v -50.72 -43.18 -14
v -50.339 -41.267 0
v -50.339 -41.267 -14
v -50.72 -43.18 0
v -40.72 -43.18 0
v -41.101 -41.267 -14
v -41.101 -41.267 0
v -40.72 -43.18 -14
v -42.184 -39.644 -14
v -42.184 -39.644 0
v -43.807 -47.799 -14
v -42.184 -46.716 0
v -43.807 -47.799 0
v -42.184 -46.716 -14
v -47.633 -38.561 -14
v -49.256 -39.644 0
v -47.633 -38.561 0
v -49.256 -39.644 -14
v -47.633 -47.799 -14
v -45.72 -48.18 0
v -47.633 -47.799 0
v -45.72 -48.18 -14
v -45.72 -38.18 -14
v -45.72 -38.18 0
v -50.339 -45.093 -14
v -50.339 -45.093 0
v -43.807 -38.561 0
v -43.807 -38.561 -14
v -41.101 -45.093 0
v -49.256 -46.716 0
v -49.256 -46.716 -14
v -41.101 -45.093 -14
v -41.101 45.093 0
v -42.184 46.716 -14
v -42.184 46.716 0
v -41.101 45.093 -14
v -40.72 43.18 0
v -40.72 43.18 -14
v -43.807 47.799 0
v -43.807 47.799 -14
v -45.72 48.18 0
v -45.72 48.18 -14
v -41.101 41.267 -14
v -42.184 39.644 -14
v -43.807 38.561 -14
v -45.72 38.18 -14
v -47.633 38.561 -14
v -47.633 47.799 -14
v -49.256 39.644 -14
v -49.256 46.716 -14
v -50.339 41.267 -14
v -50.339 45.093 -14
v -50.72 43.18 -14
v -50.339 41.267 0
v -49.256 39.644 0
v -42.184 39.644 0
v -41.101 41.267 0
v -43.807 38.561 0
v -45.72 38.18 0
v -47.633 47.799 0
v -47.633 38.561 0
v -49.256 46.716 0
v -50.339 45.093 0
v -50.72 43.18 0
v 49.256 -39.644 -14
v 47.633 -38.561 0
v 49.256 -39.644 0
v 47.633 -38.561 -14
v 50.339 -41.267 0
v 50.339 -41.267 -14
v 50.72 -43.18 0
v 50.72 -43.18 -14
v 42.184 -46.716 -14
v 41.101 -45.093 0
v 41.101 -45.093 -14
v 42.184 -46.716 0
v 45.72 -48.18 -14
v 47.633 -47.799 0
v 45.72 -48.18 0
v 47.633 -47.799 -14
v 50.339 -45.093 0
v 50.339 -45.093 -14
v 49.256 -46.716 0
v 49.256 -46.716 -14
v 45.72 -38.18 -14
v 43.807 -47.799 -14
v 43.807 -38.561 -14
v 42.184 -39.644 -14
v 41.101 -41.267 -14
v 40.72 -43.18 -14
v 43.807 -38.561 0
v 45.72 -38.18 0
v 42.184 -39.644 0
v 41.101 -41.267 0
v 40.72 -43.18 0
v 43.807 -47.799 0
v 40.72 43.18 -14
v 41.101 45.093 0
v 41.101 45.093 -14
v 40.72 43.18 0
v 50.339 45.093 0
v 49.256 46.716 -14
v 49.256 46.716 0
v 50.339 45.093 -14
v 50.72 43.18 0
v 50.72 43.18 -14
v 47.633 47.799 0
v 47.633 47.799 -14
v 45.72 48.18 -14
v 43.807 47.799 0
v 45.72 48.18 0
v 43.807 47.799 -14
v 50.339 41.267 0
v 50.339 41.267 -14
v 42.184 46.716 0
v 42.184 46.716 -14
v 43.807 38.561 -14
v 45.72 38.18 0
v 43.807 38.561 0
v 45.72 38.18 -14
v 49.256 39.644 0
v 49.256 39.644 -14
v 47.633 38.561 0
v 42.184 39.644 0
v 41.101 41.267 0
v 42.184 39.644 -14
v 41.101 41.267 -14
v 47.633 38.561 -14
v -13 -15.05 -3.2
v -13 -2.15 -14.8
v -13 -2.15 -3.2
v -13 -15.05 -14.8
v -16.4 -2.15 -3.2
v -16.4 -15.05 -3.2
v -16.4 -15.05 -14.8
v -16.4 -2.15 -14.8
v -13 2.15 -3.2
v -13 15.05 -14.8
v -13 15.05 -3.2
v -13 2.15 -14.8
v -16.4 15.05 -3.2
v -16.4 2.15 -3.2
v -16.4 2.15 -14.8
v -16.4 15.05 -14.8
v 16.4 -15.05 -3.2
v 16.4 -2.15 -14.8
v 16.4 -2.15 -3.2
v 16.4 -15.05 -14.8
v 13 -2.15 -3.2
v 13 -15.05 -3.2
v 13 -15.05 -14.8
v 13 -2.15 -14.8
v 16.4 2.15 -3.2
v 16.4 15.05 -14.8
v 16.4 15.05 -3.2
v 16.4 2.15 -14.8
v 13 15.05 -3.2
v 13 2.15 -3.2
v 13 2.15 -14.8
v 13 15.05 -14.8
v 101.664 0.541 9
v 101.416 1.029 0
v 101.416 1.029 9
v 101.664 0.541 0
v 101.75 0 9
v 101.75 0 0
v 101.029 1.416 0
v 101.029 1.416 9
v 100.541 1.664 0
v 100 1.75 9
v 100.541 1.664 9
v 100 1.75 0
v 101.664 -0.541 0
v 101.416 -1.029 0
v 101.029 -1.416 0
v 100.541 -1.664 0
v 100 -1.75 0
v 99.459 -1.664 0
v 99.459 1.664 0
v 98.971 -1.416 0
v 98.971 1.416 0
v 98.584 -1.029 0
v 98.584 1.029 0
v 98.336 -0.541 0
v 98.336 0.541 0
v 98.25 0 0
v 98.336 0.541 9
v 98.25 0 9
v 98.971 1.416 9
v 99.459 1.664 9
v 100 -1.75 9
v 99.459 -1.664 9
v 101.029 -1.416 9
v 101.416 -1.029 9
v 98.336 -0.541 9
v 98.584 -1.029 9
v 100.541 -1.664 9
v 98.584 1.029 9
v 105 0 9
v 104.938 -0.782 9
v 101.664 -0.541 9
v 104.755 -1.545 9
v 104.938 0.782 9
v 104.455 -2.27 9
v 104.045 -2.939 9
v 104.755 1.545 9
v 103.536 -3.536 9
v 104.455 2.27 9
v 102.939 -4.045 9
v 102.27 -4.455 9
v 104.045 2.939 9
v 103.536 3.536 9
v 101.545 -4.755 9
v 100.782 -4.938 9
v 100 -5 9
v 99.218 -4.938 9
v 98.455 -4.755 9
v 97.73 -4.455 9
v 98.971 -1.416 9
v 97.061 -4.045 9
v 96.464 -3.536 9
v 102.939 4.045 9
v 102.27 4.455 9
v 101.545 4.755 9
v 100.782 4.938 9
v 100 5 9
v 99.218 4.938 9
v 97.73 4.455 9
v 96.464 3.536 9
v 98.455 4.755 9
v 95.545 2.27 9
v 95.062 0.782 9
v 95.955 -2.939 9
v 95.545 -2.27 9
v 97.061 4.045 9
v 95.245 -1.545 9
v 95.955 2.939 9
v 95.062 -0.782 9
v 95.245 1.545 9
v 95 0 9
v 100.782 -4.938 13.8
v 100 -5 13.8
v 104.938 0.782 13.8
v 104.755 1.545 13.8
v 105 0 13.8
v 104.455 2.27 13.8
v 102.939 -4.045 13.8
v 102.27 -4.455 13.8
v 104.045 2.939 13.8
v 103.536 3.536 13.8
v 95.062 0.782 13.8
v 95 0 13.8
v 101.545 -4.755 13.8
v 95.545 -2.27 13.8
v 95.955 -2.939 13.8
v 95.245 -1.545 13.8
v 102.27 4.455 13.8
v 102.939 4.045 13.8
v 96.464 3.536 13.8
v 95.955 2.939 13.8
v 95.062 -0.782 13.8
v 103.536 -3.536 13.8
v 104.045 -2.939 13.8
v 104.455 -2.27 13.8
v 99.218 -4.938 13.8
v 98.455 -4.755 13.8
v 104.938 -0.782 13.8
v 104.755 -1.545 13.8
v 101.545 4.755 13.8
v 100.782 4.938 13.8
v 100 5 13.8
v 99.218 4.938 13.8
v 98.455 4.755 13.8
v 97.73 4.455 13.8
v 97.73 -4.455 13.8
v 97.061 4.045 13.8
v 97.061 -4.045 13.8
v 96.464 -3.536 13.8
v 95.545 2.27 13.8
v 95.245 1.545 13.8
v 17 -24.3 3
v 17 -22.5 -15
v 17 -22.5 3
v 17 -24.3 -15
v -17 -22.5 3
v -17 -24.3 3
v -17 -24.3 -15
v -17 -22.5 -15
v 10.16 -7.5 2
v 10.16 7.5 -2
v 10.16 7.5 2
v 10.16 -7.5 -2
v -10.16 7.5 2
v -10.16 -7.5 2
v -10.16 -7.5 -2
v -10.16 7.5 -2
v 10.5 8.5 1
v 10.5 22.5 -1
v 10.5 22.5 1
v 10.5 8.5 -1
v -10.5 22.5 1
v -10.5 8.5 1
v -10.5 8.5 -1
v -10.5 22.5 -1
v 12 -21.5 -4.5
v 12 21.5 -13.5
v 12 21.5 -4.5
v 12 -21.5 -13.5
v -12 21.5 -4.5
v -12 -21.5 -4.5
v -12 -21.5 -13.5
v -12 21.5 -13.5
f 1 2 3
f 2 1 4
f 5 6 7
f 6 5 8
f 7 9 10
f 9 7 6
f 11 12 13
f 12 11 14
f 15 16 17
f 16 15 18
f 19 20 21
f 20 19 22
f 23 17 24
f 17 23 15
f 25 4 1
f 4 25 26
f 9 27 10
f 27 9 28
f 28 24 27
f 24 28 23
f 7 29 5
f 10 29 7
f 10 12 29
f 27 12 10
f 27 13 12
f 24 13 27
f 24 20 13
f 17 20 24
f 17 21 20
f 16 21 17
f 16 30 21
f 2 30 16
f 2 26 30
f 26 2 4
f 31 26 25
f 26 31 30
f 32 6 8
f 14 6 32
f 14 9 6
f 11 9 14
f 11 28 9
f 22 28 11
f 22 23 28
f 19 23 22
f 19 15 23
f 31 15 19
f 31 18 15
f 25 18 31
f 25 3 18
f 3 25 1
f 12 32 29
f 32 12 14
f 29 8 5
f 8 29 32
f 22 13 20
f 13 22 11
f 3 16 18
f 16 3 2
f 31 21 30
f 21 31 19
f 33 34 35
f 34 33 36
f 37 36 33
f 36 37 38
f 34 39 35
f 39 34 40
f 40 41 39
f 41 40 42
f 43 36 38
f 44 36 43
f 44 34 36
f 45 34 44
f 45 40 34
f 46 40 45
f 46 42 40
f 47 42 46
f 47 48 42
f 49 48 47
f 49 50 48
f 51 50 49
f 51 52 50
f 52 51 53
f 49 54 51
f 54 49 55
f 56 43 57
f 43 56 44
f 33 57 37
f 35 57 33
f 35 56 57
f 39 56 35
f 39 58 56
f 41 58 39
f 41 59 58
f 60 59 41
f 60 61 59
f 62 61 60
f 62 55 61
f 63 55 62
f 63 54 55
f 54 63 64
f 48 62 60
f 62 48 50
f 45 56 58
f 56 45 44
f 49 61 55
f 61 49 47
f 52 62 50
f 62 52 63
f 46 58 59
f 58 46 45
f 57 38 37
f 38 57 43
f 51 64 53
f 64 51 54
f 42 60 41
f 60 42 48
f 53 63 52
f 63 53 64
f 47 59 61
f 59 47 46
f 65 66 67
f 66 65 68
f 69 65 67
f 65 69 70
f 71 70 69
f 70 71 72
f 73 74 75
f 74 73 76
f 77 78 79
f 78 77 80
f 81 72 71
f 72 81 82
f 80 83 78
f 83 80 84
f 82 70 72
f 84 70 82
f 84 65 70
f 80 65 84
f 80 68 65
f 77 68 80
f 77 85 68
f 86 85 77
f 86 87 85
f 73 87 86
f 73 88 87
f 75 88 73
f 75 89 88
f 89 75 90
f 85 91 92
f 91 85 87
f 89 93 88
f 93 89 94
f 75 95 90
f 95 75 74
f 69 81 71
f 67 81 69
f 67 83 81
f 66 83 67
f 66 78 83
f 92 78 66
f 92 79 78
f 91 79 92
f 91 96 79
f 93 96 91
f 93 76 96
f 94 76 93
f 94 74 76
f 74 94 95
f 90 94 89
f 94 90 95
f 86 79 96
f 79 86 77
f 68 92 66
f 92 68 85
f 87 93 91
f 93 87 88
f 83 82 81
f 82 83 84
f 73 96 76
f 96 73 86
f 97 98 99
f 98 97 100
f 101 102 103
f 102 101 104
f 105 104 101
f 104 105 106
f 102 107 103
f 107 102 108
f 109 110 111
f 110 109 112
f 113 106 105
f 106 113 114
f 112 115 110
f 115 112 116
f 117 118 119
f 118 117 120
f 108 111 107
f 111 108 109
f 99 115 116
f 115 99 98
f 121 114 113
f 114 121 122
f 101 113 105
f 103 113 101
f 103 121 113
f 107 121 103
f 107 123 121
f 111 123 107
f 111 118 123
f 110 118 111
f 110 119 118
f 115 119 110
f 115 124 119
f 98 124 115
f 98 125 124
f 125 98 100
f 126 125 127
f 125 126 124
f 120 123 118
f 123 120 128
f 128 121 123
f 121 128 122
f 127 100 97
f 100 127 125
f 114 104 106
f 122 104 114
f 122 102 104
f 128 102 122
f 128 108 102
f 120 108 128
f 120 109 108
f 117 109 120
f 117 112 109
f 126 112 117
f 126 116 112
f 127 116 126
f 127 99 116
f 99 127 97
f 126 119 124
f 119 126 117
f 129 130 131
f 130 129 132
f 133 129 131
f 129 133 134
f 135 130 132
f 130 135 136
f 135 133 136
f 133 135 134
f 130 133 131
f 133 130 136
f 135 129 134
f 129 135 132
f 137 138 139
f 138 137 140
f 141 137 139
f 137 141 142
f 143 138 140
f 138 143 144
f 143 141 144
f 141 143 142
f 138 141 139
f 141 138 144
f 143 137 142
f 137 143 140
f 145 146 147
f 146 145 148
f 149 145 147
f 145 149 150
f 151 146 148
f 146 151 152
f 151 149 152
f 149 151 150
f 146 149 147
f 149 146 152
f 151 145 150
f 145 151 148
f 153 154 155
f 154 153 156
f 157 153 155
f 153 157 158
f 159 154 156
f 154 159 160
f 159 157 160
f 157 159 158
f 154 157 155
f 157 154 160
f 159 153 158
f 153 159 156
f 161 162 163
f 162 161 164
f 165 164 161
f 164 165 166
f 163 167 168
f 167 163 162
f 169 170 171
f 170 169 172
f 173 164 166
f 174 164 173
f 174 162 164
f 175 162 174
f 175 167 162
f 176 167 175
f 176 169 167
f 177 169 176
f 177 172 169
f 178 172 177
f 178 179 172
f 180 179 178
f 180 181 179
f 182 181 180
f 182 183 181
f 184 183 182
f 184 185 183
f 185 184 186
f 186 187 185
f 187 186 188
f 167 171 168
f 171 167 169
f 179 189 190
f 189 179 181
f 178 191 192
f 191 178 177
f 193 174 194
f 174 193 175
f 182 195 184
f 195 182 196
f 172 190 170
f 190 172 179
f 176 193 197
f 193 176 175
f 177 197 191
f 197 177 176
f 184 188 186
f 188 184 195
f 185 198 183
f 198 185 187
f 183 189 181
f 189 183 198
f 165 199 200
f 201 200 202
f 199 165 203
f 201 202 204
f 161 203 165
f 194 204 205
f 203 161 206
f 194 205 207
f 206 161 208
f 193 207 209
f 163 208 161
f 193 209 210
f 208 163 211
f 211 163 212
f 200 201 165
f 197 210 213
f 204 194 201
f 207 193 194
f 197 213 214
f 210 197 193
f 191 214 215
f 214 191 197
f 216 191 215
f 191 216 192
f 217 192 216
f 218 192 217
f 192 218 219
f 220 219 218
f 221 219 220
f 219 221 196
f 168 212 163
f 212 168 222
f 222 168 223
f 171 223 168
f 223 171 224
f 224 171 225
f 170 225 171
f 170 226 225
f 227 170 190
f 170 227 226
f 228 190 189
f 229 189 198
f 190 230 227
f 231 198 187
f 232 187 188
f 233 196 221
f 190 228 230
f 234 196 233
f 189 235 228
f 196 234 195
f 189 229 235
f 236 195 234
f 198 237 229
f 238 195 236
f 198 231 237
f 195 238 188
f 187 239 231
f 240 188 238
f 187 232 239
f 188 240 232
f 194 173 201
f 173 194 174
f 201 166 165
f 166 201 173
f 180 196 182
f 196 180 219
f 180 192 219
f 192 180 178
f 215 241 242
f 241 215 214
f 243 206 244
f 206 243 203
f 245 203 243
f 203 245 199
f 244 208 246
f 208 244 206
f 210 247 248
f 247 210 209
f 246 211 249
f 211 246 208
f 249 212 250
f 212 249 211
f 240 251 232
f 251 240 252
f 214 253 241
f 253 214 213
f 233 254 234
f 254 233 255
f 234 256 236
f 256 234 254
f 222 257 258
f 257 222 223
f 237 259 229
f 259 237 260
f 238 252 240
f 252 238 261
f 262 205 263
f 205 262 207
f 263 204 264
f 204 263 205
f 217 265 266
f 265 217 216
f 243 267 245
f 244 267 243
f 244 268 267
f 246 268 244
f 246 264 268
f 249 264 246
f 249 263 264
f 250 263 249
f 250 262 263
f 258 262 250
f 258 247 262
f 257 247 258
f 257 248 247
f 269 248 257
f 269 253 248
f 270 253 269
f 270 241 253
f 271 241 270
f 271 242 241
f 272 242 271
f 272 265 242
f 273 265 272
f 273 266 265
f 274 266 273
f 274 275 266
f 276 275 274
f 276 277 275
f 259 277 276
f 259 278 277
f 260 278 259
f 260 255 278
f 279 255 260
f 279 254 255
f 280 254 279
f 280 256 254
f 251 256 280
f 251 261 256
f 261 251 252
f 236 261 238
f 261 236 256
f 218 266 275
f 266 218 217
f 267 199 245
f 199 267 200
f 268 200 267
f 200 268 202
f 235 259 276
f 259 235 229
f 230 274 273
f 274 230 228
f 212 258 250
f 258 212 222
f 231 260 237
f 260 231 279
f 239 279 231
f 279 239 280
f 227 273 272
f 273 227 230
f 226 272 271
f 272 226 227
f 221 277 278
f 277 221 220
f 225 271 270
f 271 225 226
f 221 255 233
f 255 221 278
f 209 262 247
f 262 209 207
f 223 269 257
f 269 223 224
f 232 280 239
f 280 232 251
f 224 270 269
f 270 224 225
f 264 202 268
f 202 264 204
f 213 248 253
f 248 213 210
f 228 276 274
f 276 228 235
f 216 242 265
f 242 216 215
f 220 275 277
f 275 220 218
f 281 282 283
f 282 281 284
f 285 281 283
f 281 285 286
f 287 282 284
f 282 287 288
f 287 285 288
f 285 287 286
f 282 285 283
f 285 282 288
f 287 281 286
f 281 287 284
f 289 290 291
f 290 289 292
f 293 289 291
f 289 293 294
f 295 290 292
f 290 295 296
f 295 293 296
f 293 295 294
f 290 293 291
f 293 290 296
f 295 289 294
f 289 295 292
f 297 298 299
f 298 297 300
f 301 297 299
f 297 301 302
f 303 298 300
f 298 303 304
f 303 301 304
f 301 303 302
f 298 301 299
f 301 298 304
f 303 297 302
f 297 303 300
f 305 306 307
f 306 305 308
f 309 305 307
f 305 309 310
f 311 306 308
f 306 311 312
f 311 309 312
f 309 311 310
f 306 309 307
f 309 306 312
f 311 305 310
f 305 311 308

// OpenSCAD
//micro quad
//include <Libs.scad>
INCH = 25.4;

propDH = [3*INCH,5];

motorCenters= [1.8*INCH,1.7*INCH]; //45.2,40.64
motorDH=[10,14];
motorWeigth=2;

motorPropTrust=36;

rxSize=[21,14,2];
rxWeight=2;

gyroSize=[20.32,15,4];
gyroWeight=2;

arduinoSize=[34,1.8,18];
arduinoWeight=3;

fcSize=[0,0,0];
fcWeigth=0;

escSize=[3.4,12.9,11.6];
escWeigth=.6; //0.36; j'ajoute le poids des fils ici

batSize=[24,43,9];
batWeigth=19;

echo ("diametre des hélices : ", propDH[0], "mm");

printSize = [motorDH[0]+2*motorCenters[0], motorDH[0]+2*motorCenters[1], 60];
echo ("class : " , 2*sqrt(pow(motorCenters[0],2)+pow(motorCenters[1],2)));
echo ("Lxlxh moteur a moteur : ", printSize, "mm" );
*%cube(printSize,center=true);

globalSize = [propDH[0]+2*motorCenters[0], propDH[0]+2*motorCenters[1], propDH[1]+motorDH[1]];
echo ("Lxlxh hors tout : ", globalSize, "mm");
translate([0,0,(propDH[1]-motorDH[1])/2])
*%cube(globalSize, center=true);

echo ("poids total : ", 4*motorWeigth + 4*escWeigth + fcWeigth + batWeigth, "g");
echo ("poids limite : ", 4/3*motorPropTrust, "g");
echo ("trust total : ", 4*motorPropTrust, "g");


for(x = [-1,1],y=[-1,1]){
	translate([x*motorCenters[0], y*motorCenters[1], propDH[1]/2])
	%color("red")cylinder(r=propDH[0]/2, h=propDH[1], center=true);

	translate([x*motorCenters[0], y*motorCenters[1], -motorDH[1]/2])
	cylinder(r=motorDH[0]/2, h=motorDH[1],center=true);	
}

cube(fcSize, center=true);

translate([0,-batSize[1]/2-arduinoSize[1]/2-1,-arduinoSize[2]/3])cube(arduinoSize,center=true);
translate([0,0,0])cube(gyroSize,center=true);
translate([0,rxSize[1]/2+gyroSize[1]/2+1,0])cube(rxSize,center=true);


translate([0,0,-batSize[2]])
cube(batSize,center=true);

for(x = [-1,1],y=[-1,1]){
	translate([x*(batSize[0]+escSize[0]+2)/2, y*(batSize[1]/2-escSize[1]), -batSize[2]])
	cube(escSize,center=true);
}


//tmp futur micro 2g

module arm(){
	cylinder(r=1.75, h=9,$fn=20);
	translate([0,0,9])cylinder(r=5, h=4.8,$fn=40);

}
translate([100,0 ,0 ]){
arm();
}
